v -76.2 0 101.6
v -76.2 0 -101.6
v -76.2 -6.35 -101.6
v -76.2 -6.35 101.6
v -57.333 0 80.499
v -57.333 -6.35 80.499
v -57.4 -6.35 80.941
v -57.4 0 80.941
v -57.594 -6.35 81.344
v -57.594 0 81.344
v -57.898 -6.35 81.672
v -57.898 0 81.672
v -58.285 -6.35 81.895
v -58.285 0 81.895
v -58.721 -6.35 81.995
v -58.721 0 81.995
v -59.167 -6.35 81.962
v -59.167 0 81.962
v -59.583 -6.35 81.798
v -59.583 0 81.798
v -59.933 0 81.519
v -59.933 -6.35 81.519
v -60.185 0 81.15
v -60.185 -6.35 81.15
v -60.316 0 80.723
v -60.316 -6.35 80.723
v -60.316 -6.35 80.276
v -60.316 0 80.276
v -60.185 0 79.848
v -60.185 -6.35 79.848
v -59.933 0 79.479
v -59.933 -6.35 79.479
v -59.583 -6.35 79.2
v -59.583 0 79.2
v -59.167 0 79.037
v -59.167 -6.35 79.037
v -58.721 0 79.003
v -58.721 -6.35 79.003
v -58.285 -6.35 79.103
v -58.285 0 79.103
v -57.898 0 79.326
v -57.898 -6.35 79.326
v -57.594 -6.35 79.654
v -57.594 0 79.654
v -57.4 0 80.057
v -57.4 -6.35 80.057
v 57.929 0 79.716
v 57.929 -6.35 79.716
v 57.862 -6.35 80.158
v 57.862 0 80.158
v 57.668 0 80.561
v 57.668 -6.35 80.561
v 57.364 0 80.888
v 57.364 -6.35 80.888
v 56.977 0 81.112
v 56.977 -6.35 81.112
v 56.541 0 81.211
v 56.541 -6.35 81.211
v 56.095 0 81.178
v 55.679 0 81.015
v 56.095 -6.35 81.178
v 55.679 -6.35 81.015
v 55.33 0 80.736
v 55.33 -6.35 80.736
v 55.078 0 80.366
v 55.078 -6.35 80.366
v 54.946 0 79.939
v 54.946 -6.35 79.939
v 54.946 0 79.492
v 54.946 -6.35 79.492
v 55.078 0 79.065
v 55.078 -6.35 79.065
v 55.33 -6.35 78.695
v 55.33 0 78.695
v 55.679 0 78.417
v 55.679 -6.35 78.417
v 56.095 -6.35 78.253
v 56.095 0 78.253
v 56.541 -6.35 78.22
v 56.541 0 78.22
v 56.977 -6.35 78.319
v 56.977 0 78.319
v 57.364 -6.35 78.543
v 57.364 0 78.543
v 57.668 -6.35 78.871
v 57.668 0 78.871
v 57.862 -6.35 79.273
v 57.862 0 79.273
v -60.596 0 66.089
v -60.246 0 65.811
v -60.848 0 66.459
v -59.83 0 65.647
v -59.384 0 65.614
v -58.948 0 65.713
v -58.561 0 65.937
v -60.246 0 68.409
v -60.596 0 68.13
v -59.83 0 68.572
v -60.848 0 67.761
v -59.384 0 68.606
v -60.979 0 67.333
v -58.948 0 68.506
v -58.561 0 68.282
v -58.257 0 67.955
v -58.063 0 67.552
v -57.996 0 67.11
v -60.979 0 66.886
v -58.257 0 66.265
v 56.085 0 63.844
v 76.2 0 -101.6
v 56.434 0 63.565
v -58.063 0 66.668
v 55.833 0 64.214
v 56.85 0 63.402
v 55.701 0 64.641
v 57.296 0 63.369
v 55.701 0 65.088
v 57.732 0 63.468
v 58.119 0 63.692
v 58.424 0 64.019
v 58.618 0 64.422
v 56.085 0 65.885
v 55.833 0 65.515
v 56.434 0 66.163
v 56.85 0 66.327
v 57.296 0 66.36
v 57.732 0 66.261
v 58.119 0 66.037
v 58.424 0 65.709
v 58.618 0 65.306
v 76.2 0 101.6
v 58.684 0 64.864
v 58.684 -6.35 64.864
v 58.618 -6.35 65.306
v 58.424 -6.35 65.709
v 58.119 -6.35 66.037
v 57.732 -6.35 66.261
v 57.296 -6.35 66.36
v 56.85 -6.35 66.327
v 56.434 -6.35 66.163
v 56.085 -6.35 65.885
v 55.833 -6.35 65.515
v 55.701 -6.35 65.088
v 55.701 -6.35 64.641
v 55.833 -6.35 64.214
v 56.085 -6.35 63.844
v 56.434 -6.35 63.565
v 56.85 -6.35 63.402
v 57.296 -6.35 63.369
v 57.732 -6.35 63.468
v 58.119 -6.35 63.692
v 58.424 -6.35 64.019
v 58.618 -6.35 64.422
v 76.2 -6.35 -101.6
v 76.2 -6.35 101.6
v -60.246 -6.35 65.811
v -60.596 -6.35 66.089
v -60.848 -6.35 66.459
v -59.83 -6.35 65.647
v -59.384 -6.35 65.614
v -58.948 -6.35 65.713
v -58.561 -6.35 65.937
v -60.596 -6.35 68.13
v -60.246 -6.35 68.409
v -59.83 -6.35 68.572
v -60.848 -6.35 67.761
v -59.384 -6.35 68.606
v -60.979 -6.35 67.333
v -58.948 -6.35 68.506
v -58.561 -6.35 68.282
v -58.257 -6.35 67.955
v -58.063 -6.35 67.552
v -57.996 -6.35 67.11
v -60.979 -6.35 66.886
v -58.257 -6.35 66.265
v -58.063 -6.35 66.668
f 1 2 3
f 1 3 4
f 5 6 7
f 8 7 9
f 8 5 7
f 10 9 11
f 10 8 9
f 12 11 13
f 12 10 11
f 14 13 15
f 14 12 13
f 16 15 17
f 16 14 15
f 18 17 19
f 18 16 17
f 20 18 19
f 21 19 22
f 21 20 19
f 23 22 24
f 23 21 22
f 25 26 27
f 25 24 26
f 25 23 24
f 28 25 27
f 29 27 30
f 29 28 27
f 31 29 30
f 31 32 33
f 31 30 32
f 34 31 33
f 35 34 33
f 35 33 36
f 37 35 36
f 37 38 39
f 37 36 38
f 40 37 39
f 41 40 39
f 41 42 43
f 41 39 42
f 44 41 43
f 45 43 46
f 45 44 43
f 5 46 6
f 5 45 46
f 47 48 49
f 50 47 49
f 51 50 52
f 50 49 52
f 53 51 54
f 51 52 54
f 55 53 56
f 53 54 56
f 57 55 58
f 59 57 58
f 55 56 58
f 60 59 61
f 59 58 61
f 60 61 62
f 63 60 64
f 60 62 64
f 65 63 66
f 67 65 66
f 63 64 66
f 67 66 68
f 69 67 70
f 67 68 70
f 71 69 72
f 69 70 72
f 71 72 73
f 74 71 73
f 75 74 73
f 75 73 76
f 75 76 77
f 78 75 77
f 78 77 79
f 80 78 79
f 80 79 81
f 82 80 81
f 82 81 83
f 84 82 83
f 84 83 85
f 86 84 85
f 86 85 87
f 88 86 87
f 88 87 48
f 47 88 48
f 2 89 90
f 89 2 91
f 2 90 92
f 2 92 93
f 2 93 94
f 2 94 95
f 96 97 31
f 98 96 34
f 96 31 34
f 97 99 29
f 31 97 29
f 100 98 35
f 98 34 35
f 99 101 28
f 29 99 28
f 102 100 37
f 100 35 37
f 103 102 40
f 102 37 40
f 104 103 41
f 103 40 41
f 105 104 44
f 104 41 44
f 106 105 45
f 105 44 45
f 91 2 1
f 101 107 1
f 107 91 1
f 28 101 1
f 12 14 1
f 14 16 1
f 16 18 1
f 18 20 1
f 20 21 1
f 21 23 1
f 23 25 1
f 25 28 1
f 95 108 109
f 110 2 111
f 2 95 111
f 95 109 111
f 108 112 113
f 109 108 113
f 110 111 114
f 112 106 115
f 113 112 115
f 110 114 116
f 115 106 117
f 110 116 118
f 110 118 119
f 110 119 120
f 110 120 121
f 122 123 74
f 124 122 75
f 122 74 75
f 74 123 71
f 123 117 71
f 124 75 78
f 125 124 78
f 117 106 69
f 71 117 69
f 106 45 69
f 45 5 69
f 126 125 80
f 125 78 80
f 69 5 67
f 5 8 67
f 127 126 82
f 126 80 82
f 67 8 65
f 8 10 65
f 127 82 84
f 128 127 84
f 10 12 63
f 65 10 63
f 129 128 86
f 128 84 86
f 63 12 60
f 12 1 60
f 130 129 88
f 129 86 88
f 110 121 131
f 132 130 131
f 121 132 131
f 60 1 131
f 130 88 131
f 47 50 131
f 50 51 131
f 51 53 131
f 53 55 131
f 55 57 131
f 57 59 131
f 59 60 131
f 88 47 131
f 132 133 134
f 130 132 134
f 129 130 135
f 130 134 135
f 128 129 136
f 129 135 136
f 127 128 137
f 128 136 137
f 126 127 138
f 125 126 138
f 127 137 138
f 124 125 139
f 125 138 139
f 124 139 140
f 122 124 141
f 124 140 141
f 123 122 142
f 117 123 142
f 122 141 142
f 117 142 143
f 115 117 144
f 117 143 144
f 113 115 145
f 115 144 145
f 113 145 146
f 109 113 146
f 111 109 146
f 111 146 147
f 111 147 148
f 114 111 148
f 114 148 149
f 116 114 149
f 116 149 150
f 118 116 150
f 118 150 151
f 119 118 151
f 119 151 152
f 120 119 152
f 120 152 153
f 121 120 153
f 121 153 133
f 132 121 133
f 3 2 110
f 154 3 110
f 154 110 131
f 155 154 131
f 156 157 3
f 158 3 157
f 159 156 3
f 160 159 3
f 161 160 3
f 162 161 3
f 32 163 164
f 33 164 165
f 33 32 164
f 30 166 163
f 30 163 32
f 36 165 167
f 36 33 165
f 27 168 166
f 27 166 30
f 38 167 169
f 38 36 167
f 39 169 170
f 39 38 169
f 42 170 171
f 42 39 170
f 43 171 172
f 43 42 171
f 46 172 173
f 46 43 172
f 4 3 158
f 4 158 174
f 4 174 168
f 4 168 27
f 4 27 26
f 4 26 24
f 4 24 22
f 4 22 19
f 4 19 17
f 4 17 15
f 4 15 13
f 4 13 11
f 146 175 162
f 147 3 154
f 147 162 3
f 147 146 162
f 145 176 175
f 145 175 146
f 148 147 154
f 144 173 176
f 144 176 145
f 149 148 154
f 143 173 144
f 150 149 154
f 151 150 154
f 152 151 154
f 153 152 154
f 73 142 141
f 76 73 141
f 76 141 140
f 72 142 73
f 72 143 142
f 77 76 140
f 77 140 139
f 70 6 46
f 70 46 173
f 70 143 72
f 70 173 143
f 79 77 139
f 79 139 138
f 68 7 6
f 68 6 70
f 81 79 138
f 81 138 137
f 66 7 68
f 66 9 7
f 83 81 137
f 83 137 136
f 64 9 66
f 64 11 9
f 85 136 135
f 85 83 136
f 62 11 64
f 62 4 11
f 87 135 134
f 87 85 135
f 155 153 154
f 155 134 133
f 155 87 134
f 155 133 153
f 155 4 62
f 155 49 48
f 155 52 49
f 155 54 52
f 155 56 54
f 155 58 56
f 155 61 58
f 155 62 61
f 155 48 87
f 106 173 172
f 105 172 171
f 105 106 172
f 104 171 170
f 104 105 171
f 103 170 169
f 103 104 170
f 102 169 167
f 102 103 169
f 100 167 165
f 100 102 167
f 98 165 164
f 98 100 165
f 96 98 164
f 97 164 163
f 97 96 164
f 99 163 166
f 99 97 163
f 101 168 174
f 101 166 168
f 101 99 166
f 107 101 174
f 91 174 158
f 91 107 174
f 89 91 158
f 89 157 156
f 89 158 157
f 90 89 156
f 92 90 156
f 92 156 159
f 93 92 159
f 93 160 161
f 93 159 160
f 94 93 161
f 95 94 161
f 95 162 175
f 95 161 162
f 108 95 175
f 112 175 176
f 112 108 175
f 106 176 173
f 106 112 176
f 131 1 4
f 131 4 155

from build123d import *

# Parameters (mm, degrees)
F0_W     = 152.4
F0_H     = 203.2
F1_DEPTH = 6.35
F2_R     = 1.5
F3_R     = 1.5
F4_DEPTH = 14.2
F5_R     = 1.5
F6_DEPTH = 25
F7_R     = 1.5
F8_DEPTH = 25


with BuildPart() as f1:
    # F0 (on Front) → F1 (new body)
    with BuildSketch(Plane.XZ):
        Rectangle(F0_W, F0_H)
    extrude(amount=F1_DEPTH)

    # F2 (on Front) + F3 (on Front) → F4 (cut)
    with BuildSketch(Plane.XZ):
        with Locations((-58.833122, 80.499172)):
            Circle(F2_R)
    with BuildSketch(Plane.XZ):
        with Locations((-59.496228, 67.109719)):
            Circle(F3_R)
    extrude(amount=F4_DEPTH, mode=Mode.SUBTRACT)

    # F5 (on Front) → F6 (cut)
    with BuildSketch(Plane.XZ):
        with Locations((57.177279, 77.691041)):
            Circle(F5_R)
        with Locations((57.177279, 64.519793)):
            Circle(F5_R)
    extrude(amount=-F6_DEPTH, mode=Mode.SUBTRACT)

    # F7 (on face) → F8 (cut)
    with BuildSketch(Plane.XZ.offset(6.35)):
        with Locations((56.429084, 79.715557)):
            Circle(F7_R)
        with Locations((57.184231, 64.864337)):
            Circle(F7_R)
    extrude(amount=-F8_DEPTH, mode=Mode.SUBTRACT)


solid = f1.part
